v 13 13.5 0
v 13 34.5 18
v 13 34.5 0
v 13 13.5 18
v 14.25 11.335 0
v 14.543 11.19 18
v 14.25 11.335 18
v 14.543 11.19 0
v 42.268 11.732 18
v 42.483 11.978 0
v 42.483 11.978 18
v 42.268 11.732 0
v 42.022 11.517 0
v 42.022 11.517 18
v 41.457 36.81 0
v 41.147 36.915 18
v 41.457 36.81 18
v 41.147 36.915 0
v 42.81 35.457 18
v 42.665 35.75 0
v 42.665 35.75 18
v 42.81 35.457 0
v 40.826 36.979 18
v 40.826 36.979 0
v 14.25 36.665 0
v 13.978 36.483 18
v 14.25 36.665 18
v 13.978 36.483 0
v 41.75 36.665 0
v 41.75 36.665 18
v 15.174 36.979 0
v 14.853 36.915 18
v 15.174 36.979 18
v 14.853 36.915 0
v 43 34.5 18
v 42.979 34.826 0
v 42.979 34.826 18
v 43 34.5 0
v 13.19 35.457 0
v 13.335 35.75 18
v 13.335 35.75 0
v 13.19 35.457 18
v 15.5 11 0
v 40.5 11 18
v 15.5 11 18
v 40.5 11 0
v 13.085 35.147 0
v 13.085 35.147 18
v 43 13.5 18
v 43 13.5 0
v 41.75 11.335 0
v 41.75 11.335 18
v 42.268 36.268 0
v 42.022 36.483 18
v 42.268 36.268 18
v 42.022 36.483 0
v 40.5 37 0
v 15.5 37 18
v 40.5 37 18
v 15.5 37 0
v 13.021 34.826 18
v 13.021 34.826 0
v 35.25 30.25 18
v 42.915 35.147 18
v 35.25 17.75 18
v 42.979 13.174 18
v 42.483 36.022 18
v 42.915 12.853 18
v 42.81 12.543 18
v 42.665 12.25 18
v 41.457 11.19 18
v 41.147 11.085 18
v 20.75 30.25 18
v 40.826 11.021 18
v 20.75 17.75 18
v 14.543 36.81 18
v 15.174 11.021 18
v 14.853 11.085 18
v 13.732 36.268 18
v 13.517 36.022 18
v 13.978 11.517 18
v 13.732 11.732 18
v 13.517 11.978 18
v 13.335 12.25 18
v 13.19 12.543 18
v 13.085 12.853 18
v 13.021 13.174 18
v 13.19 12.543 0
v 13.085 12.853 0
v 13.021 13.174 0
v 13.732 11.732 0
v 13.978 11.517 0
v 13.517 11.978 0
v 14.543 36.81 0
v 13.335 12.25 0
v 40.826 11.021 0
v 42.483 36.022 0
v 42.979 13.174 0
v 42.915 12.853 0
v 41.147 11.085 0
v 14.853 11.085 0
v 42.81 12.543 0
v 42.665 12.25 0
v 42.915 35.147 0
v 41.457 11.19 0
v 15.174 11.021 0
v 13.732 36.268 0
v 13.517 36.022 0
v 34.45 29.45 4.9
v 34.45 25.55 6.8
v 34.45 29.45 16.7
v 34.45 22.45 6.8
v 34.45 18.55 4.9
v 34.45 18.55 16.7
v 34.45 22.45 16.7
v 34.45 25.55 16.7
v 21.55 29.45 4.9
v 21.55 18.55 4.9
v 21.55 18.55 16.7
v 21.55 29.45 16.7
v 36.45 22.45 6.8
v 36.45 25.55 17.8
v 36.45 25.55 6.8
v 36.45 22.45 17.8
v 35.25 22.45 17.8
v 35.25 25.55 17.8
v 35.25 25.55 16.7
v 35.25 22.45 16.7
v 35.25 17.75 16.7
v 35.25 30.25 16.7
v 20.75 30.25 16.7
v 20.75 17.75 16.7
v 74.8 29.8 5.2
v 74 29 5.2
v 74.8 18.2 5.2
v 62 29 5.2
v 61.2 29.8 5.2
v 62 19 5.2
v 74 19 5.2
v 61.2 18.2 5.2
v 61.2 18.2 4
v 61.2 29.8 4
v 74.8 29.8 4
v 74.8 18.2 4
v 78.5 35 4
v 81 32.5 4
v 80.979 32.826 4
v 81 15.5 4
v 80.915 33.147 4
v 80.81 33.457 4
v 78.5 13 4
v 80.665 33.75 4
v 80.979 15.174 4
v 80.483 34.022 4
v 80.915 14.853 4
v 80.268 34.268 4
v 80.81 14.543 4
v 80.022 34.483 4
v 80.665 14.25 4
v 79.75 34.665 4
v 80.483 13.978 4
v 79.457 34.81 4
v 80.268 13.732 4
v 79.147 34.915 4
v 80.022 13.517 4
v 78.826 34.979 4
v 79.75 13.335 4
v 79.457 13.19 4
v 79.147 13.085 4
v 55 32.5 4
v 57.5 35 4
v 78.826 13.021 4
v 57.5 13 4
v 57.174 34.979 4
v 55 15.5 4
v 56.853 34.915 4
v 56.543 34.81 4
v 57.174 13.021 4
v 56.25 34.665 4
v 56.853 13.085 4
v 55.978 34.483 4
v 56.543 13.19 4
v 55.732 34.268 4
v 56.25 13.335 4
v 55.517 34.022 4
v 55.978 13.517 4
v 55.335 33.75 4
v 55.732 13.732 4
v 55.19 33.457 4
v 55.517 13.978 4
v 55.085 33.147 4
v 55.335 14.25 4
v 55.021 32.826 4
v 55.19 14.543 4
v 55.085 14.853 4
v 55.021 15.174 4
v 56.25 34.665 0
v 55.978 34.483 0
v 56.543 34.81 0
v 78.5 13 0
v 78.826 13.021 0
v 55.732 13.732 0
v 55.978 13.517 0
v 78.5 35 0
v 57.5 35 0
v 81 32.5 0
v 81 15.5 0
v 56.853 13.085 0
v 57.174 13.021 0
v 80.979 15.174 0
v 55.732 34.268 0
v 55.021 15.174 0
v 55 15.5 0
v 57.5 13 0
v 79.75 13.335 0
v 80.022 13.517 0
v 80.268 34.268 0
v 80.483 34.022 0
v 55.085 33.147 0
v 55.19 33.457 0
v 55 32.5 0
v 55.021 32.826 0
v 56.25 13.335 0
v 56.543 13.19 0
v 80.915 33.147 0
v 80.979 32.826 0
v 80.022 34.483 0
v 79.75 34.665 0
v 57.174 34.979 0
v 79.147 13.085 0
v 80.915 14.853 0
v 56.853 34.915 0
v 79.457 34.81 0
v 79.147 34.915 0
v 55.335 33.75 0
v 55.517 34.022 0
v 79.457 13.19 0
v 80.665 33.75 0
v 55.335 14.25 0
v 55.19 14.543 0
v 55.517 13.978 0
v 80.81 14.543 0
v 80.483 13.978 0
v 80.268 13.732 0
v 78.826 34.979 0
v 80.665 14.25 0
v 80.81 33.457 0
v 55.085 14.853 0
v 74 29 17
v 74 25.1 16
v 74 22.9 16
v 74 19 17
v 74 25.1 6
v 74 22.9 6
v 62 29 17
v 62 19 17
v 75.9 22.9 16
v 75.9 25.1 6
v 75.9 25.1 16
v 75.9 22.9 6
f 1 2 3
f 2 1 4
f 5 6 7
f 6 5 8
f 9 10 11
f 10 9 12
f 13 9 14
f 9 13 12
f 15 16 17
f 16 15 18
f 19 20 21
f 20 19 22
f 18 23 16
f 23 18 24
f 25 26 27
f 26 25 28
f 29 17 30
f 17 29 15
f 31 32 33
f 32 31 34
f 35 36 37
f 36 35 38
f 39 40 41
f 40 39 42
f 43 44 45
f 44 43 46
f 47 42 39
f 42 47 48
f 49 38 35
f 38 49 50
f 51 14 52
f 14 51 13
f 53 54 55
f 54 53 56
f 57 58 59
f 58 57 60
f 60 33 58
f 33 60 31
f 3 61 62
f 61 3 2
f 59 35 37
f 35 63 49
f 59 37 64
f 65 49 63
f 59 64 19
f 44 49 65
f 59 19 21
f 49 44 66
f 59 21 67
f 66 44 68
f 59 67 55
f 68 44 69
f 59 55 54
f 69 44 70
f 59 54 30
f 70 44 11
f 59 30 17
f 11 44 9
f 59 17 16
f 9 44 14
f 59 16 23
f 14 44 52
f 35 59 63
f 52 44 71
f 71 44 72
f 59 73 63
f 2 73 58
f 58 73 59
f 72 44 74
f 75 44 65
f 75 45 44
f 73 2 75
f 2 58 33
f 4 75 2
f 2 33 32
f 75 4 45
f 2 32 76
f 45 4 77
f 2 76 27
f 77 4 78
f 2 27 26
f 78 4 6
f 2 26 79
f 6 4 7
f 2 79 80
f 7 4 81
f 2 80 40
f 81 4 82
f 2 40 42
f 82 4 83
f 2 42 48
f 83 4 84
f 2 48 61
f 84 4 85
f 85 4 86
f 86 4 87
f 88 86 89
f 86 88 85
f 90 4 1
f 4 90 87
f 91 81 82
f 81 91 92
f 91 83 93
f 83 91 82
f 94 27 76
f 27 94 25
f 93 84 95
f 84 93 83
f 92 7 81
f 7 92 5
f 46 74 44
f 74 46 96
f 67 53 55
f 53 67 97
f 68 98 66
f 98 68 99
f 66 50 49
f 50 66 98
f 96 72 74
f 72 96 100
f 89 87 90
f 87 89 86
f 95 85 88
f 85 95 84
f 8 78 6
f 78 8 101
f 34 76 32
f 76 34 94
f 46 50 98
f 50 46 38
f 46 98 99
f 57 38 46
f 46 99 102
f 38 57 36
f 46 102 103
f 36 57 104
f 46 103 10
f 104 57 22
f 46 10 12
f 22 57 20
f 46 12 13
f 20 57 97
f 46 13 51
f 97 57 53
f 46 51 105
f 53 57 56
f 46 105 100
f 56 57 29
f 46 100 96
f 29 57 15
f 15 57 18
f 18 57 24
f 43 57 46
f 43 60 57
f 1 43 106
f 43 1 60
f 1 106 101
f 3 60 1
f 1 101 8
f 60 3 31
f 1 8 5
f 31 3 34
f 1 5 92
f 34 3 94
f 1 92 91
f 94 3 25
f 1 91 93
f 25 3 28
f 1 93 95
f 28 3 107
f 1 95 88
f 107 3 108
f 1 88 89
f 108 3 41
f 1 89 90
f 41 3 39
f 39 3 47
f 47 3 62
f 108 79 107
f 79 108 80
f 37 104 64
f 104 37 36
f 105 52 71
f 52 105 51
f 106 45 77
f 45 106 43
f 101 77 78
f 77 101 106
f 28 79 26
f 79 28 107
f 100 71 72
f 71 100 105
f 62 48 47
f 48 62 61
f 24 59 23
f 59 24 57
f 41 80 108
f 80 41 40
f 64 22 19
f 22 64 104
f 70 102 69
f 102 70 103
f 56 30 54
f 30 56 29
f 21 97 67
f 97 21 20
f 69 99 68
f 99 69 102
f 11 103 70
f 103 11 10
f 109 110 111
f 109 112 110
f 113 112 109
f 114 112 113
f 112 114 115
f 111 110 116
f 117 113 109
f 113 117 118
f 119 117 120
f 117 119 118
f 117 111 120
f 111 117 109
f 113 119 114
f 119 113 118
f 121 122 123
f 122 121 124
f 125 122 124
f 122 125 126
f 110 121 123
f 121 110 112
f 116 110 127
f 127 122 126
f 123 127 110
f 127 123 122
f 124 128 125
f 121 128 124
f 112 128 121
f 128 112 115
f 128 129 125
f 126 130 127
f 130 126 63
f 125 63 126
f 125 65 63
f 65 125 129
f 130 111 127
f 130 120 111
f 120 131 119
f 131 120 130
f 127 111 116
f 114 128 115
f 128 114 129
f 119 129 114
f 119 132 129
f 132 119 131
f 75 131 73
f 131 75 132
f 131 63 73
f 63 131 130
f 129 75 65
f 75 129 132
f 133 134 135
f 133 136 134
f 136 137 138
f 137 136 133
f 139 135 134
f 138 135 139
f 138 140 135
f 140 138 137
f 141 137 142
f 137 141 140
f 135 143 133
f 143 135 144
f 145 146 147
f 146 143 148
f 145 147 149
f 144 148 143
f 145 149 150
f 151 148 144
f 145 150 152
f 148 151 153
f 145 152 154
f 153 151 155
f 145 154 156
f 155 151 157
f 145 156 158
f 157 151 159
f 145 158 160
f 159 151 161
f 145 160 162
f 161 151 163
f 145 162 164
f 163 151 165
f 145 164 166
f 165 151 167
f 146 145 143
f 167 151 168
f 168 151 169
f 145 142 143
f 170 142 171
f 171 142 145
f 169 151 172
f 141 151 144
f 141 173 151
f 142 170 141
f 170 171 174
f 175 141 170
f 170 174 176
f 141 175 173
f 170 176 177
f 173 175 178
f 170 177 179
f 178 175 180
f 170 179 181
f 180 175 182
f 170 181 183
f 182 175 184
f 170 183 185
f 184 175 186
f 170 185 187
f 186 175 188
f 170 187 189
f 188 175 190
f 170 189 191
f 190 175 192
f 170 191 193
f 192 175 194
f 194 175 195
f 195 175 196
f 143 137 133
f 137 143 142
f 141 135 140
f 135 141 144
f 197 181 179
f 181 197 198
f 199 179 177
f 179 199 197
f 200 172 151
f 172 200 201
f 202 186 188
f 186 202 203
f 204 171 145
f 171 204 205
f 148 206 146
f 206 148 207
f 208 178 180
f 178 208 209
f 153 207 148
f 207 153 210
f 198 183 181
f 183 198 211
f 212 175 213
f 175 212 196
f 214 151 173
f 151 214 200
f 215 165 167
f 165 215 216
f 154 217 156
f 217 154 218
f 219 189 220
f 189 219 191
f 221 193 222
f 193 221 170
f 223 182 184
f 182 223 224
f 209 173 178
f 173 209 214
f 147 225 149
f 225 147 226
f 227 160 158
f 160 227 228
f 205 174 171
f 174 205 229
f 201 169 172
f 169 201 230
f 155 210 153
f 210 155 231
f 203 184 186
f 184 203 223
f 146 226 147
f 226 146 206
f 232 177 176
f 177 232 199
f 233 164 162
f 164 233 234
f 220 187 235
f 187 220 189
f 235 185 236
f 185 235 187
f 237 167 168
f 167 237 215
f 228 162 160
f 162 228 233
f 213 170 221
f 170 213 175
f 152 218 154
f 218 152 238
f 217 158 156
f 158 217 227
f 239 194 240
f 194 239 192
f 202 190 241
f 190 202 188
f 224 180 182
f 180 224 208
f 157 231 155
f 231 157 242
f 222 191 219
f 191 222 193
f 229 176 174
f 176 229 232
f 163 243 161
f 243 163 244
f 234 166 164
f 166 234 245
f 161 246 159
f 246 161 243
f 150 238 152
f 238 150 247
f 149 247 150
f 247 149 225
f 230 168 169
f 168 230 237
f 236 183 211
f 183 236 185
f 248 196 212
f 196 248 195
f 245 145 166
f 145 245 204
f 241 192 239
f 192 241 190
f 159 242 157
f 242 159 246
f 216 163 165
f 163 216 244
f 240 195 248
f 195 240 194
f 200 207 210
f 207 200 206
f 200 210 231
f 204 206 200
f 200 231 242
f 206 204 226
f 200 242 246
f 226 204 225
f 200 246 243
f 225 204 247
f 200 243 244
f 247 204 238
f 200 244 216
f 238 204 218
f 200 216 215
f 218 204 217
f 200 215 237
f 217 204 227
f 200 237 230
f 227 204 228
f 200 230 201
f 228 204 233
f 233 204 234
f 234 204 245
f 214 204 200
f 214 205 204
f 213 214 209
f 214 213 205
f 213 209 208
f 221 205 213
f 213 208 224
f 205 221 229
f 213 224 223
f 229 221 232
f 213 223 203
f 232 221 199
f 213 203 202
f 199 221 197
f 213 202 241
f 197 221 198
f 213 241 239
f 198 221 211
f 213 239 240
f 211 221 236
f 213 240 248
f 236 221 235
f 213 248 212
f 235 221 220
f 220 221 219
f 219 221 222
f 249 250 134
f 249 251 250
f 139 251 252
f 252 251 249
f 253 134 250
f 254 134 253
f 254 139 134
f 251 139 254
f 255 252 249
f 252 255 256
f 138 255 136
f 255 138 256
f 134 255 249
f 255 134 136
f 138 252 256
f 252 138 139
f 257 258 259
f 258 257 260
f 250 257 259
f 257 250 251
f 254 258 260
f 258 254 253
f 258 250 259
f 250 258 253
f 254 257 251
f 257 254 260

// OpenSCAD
/*
Sample 044: Verdrehsichere Schlüssel-Steckverbindung — 0,45 mm
Generated from the FDM Mechanical Sample Library.
Units: millimetres.

Override examples:
  openscad -o custom.stl -D 'view="plate"' -D 'render_fn=64' model.scad
  openscad -o preview.png -D 'view="assembly"' model.scad
*/
use <../../../library/fdm_mechanisms.scad>

render_fn = is_undef(render_fn) ? 48 : render_fn;
view = is_undef(view) ? "plate" : view;
$fn = render_fn;

sample_keyed_plug_socket(
    view=view,
    clearance=0.45
);
